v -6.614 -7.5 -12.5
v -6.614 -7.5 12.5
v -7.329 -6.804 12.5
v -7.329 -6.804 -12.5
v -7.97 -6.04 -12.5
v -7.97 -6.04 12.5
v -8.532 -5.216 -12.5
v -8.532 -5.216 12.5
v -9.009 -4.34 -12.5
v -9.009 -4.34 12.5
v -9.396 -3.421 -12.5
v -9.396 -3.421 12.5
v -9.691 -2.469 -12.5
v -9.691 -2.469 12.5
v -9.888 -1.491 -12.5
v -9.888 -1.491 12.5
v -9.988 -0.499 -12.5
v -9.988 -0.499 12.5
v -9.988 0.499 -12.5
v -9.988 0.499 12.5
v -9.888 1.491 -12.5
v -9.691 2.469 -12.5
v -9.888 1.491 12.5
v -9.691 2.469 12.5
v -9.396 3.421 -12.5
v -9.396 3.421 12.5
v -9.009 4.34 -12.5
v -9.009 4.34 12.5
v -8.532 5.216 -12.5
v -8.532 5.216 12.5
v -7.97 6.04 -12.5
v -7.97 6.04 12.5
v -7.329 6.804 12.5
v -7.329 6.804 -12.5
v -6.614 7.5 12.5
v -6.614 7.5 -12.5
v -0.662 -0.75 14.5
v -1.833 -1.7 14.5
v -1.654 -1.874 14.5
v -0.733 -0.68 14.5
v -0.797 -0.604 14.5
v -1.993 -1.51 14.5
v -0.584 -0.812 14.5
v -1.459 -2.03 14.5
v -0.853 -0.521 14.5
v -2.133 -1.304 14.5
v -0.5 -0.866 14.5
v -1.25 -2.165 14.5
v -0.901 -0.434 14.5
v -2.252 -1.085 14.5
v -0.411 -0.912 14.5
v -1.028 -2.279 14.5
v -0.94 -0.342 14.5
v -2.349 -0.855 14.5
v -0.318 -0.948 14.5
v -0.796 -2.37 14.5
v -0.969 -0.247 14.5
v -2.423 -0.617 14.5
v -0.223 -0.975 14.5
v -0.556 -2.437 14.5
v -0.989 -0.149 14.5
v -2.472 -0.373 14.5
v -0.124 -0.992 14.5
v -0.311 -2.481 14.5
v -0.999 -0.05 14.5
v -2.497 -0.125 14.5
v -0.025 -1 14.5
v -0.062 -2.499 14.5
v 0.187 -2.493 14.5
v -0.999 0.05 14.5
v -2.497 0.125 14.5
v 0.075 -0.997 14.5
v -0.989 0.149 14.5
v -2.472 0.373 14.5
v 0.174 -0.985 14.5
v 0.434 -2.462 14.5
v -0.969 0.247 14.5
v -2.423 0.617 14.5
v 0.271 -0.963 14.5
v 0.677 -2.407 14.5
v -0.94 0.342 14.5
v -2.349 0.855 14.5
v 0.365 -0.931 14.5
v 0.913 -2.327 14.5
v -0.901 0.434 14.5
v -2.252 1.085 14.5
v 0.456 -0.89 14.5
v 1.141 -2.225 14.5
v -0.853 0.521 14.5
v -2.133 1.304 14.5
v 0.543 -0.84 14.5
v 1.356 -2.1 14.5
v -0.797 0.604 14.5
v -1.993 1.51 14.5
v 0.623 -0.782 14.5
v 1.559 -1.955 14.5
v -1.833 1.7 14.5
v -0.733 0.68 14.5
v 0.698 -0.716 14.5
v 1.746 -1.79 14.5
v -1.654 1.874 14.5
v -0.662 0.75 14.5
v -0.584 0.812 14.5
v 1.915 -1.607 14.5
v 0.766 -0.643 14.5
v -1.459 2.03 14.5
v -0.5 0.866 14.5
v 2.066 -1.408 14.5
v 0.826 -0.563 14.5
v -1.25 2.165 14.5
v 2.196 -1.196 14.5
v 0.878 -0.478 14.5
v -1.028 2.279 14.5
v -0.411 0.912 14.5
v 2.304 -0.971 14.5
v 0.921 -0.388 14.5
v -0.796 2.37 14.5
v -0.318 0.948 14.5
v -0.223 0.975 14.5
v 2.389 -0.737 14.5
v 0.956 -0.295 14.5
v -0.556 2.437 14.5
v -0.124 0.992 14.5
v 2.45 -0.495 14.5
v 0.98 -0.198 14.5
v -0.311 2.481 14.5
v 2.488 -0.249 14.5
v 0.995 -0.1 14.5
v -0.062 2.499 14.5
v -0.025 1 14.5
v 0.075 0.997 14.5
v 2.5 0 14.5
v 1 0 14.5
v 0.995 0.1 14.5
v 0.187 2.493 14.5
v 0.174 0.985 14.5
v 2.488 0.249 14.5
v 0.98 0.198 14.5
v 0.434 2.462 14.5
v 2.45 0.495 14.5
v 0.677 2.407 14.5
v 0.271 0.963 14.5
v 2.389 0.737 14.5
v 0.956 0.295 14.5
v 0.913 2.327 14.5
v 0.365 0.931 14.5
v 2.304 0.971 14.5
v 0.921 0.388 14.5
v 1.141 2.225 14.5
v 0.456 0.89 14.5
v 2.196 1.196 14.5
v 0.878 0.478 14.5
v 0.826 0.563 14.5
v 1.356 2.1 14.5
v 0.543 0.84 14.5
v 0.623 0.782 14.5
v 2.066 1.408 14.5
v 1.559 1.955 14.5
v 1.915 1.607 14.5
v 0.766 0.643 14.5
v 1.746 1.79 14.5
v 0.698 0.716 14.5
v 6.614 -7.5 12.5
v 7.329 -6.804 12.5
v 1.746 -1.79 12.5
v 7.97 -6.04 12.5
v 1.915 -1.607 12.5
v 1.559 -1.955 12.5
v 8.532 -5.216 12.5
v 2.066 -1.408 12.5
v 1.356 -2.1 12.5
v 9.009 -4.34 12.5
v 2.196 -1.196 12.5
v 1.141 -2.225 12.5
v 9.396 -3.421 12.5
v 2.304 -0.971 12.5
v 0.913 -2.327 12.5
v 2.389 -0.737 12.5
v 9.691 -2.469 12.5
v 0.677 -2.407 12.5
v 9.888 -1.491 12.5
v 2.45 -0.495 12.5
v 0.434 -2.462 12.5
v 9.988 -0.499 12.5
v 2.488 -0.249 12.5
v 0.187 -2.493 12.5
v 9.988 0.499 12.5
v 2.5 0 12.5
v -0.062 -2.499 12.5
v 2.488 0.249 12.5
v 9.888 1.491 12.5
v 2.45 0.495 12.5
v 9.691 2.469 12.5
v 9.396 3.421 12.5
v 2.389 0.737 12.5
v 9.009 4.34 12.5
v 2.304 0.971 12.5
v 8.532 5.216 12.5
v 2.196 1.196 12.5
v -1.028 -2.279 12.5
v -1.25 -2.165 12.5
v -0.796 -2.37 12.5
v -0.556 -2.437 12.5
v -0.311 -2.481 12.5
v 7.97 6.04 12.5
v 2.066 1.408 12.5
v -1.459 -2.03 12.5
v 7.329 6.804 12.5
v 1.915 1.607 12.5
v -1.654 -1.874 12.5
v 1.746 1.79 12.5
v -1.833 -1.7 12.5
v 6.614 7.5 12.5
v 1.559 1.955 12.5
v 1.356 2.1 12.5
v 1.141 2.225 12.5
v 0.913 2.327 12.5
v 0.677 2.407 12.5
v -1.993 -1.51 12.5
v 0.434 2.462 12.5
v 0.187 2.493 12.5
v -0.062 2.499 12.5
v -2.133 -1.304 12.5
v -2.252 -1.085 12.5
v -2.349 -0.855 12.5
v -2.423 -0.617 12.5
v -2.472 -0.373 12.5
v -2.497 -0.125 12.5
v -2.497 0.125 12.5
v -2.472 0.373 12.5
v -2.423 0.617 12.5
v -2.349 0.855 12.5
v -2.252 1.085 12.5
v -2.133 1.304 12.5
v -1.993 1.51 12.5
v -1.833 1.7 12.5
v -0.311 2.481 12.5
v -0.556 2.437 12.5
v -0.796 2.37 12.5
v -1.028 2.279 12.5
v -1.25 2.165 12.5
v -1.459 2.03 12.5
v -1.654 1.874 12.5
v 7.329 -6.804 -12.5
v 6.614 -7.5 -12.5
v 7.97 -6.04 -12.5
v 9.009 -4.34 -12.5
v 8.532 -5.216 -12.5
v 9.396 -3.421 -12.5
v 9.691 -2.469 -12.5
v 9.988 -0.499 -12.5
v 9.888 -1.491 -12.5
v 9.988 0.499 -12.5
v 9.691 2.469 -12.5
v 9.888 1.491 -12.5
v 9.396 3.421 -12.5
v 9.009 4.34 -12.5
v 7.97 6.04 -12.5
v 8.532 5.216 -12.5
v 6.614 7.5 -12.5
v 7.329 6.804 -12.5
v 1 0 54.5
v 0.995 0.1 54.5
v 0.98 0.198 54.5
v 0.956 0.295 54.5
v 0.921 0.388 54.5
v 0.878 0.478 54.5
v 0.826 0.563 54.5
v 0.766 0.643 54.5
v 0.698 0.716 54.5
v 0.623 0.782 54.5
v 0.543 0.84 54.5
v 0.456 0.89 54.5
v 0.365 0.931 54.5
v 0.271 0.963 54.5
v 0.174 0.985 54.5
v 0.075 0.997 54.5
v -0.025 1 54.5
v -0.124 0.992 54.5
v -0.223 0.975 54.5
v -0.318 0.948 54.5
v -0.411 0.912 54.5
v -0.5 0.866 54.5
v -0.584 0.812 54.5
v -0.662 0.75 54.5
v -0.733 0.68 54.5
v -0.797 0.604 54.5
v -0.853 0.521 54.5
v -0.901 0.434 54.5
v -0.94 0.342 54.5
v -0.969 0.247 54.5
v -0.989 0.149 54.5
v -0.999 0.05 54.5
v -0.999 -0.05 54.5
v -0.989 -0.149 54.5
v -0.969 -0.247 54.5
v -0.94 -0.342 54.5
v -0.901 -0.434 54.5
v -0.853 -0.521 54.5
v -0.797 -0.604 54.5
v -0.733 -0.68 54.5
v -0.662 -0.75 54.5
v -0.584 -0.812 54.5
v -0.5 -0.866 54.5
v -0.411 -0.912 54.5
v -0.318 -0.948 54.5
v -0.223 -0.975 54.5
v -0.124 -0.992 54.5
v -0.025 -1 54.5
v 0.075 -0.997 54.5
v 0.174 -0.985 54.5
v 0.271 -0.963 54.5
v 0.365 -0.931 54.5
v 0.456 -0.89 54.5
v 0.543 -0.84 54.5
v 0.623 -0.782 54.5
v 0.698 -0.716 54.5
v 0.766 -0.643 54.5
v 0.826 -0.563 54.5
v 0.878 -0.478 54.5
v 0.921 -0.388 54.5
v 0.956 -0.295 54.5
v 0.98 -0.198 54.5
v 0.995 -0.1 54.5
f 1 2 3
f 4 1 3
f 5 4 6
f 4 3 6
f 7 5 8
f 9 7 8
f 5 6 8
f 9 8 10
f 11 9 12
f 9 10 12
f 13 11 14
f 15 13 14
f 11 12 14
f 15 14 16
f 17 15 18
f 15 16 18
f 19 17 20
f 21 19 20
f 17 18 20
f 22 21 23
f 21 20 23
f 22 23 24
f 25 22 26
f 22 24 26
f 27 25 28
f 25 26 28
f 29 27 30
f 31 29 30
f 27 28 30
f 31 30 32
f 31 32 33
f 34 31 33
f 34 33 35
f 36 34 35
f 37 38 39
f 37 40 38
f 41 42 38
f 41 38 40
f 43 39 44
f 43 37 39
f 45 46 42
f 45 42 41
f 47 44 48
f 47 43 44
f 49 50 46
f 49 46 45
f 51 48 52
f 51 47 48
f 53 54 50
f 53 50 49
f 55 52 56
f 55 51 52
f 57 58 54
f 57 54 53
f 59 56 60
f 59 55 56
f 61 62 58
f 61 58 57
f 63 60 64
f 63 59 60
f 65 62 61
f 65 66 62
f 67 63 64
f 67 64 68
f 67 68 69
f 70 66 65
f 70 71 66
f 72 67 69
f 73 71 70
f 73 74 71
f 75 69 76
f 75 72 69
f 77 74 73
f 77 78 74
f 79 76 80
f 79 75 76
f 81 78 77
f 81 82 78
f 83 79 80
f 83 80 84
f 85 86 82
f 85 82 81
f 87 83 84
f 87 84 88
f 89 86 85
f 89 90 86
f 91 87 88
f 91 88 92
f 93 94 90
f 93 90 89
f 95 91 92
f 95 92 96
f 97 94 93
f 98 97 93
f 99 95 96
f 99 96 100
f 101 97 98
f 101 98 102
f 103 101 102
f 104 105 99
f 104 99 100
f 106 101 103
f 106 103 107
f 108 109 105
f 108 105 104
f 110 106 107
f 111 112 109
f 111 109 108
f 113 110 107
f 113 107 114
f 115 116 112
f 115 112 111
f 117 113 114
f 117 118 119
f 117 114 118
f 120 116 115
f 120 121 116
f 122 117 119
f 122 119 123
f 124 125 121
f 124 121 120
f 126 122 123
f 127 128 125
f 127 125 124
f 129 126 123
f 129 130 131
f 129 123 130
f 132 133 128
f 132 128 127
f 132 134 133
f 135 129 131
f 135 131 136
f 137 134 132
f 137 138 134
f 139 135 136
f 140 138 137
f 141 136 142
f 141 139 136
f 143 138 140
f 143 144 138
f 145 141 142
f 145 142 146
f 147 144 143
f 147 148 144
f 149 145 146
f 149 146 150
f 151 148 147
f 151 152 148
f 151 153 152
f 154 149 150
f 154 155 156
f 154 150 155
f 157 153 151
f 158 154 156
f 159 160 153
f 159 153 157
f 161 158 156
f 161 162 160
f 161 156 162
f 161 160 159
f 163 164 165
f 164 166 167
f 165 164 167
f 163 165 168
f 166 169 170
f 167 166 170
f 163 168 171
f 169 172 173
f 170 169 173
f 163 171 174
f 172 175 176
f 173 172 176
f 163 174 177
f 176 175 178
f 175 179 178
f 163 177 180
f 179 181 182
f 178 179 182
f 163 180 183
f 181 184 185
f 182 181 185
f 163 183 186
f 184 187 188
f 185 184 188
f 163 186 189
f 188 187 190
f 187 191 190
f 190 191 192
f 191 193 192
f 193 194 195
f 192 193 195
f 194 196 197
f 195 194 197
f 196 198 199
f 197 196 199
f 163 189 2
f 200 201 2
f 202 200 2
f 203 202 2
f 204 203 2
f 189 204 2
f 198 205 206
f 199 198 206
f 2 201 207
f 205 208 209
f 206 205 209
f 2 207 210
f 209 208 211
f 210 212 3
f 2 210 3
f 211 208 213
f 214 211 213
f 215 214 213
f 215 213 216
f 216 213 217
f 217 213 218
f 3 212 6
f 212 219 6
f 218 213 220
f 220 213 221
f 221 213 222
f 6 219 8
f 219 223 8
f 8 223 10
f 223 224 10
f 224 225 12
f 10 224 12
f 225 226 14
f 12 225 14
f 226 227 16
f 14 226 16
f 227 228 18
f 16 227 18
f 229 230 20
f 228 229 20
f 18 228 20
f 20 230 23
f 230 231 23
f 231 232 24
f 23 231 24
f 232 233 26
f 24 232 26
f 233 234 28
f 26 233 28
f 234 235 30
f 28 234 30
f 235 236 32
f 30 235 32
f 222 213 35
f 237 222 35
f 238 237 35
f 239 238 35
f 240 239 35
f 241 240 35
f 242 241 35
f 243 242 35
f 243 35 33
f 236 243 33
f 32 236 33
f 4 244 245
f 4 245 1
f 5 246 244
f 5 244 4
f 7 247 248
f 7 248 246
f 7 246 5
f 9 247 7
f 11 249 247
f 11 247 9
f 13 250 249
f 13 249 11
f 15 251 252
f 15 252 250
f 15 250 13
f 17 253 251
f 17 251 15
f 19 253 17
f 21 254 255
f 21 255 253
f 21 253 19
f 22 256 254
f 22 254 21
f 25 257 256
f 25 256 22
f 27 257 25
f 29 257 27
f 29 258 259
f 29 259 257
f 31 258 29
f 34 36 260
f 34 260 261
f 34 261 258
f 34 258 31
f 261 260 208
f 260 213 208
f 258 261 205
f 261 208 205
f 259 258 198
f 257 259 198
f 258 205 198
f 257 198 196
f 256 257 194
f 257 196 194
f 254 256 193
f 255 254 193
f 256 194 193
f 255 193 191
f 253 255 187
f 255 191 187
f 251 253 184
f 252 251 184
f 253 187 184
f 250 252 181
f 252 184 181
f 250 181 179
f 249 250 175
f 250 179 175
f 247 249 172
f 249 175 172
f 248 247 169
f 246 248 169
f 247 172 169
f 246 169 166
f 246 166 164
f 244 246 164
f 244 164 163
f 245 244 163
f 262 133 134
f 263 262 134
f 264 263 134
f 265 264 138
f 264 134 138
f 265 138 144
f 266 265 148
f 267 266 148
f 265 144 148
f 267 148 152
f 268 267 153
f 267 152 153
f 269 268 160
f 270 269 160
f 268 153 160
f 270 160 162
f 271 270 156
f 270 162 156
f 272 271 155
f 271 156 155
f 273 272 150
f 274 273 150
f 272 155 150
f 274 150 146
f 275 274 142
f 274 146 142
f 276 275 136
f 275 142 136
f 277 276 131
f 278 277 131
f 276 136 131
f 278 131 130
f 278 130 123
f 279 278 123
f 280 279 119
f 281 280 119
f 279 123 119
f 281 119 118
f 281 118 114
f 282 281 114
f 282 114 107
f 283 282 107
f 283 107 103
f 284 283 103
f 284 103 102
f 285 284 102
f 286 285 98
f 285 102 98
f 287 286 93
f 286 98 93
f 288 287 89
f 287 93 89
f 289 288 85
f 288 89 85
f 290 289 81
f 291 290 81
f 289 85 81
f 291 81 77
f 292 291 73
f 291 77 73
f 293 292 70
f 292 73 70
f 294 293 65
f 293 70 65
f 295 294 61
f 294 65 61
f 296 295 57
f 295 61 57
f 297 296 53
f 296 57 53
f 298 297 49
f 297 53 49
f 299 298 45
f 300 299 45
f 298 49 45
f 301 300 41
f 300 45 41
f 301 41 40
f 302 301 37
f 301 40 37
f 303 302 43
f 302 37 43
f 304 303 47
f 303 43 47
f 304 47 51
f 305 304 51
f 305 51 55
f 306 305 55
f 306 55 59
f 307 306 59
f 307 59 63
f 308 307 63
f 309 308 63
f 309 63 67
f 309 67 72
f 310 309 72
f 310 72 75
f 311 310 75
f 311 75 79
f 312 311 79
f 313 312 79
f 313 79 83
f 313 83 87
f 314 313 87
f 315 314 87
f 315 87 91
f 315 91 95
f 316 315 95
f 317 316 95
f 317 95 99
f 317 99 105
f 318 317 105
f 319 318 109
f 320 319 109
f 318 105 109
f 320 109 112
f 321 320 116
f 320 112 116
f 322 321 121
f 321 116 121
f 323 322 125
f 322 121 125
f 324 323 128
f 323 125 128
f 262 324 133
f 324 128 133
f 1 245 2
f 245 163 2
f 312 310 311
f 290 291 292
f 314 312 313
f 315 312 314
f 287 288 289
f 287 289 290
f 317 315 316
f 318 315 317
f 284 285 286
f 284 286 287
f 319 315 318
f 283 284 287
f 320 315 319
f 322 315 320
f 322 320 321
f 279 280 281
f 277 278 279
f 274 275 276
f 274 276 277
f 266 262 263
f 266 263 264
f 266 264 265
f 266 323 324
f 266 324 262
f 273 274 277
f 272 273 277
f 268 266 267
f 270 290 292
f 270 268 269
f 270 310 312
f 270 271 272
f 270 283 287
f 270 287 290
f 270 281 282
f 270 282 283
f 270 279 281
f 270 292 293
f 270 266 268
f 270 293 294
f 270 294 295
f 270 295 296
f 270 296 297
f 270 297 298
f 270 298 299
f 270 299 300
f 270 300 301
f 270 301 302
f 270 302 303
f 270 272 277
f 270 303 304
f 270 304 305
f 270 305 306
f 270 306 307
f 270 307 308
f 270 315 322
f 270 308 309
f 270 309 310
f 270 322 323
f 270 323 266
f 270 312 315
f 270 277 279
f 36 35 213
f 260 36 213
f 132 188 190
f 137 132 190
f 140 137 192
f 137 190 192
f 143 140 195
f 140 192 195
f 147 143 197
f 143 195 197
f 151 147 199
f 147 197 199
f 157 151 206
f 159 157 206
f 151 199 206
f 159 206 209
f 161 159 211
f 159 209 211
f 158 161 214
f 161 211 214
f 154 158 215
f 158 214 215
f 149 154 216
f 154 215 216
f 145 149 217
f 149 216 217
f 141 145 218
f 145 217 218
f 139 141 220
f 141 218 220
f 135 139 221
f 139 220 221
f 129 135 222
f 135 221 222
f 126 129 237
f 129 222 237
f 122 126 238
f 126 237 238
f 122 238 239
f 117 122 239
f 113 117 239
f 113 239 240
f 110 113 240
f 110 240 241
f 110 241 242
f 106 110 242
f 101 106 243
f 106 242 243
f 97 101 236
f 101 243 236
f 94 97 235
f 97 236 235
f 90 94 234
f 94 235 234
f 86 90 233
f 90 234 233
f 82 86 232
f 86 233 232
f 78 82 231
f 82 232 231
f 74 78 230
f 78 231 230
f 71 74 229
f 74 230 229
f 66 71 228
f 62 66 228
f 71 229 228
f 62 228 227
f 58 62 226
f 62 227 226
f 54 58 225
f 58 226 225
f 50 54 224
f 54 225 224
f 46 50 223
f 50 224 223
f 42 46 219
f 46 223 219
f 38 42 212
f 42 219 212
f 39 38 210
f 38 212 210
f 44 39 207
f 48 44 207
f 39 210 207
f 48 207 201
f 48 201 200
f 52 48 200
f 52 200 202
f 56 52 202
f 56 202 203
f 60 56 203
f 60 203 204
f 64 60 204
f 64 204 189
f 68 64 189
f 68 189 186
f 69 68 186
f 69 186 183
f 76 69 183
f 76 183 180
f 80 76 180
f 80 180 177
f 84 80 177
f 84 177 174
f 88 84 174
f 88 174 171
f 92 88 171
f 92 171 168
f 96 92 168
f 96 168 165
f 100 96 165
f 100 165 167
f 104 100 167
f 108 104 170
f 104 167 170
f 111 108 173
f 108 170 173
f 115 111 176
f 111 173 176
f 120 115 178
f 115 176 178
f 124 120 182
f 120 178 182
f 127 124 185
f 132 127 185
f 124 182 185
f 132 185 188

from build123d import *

# Parameters (mm, degrees)
BOSS_EXTRU_1_DEPTH = 12.5
ESQUISSE2_R        = 2.5
BOSS_EXTRU_2_DEPTH = 2
ESQUISSE3_R        = 1
BOSS_EXTRU_3_DEPTH = 40


with BuildPart() as part:
    # Esquisse1 → Boss.-Extru.1 (new, symmetric)
    with BuildSketch(Plane.XY):
        with BuildLine():
            Line((-6.614378278, 7.5), (6.614378278, 7.5))
            ThreePointArc((6.614378278, 7.5), (10, 0), (6.614378278, -7.5))
            Line((6.614378278, -7.5), (-6.614378278, -7.5))
            ThreePointArc((-6.614378278, -7.5), (-10, 0), (-6.614378278, 7.5))
        make_face()
    extrude(amount=BOSS_EXTRU_1_DEPTH, both=True)

    # Esquisse2 → Boss.-Extru.2 (add)
    with BuildSketch(Plane.XY.offset(12.5)):
        Circle(ESQUISSE2_R)
    extrude(amount=BOSS_EXTRU_2_DEPTH)

    # Esquisse3 → Boss.-Extru.3 (add)
    with BuildSketch(Plane.XY.offset(14.5)):
        Circle(ESQUISSE3_R)
    extrude(amount=BOSS_EXTRU_3_DEPTH)


solid = part.part
